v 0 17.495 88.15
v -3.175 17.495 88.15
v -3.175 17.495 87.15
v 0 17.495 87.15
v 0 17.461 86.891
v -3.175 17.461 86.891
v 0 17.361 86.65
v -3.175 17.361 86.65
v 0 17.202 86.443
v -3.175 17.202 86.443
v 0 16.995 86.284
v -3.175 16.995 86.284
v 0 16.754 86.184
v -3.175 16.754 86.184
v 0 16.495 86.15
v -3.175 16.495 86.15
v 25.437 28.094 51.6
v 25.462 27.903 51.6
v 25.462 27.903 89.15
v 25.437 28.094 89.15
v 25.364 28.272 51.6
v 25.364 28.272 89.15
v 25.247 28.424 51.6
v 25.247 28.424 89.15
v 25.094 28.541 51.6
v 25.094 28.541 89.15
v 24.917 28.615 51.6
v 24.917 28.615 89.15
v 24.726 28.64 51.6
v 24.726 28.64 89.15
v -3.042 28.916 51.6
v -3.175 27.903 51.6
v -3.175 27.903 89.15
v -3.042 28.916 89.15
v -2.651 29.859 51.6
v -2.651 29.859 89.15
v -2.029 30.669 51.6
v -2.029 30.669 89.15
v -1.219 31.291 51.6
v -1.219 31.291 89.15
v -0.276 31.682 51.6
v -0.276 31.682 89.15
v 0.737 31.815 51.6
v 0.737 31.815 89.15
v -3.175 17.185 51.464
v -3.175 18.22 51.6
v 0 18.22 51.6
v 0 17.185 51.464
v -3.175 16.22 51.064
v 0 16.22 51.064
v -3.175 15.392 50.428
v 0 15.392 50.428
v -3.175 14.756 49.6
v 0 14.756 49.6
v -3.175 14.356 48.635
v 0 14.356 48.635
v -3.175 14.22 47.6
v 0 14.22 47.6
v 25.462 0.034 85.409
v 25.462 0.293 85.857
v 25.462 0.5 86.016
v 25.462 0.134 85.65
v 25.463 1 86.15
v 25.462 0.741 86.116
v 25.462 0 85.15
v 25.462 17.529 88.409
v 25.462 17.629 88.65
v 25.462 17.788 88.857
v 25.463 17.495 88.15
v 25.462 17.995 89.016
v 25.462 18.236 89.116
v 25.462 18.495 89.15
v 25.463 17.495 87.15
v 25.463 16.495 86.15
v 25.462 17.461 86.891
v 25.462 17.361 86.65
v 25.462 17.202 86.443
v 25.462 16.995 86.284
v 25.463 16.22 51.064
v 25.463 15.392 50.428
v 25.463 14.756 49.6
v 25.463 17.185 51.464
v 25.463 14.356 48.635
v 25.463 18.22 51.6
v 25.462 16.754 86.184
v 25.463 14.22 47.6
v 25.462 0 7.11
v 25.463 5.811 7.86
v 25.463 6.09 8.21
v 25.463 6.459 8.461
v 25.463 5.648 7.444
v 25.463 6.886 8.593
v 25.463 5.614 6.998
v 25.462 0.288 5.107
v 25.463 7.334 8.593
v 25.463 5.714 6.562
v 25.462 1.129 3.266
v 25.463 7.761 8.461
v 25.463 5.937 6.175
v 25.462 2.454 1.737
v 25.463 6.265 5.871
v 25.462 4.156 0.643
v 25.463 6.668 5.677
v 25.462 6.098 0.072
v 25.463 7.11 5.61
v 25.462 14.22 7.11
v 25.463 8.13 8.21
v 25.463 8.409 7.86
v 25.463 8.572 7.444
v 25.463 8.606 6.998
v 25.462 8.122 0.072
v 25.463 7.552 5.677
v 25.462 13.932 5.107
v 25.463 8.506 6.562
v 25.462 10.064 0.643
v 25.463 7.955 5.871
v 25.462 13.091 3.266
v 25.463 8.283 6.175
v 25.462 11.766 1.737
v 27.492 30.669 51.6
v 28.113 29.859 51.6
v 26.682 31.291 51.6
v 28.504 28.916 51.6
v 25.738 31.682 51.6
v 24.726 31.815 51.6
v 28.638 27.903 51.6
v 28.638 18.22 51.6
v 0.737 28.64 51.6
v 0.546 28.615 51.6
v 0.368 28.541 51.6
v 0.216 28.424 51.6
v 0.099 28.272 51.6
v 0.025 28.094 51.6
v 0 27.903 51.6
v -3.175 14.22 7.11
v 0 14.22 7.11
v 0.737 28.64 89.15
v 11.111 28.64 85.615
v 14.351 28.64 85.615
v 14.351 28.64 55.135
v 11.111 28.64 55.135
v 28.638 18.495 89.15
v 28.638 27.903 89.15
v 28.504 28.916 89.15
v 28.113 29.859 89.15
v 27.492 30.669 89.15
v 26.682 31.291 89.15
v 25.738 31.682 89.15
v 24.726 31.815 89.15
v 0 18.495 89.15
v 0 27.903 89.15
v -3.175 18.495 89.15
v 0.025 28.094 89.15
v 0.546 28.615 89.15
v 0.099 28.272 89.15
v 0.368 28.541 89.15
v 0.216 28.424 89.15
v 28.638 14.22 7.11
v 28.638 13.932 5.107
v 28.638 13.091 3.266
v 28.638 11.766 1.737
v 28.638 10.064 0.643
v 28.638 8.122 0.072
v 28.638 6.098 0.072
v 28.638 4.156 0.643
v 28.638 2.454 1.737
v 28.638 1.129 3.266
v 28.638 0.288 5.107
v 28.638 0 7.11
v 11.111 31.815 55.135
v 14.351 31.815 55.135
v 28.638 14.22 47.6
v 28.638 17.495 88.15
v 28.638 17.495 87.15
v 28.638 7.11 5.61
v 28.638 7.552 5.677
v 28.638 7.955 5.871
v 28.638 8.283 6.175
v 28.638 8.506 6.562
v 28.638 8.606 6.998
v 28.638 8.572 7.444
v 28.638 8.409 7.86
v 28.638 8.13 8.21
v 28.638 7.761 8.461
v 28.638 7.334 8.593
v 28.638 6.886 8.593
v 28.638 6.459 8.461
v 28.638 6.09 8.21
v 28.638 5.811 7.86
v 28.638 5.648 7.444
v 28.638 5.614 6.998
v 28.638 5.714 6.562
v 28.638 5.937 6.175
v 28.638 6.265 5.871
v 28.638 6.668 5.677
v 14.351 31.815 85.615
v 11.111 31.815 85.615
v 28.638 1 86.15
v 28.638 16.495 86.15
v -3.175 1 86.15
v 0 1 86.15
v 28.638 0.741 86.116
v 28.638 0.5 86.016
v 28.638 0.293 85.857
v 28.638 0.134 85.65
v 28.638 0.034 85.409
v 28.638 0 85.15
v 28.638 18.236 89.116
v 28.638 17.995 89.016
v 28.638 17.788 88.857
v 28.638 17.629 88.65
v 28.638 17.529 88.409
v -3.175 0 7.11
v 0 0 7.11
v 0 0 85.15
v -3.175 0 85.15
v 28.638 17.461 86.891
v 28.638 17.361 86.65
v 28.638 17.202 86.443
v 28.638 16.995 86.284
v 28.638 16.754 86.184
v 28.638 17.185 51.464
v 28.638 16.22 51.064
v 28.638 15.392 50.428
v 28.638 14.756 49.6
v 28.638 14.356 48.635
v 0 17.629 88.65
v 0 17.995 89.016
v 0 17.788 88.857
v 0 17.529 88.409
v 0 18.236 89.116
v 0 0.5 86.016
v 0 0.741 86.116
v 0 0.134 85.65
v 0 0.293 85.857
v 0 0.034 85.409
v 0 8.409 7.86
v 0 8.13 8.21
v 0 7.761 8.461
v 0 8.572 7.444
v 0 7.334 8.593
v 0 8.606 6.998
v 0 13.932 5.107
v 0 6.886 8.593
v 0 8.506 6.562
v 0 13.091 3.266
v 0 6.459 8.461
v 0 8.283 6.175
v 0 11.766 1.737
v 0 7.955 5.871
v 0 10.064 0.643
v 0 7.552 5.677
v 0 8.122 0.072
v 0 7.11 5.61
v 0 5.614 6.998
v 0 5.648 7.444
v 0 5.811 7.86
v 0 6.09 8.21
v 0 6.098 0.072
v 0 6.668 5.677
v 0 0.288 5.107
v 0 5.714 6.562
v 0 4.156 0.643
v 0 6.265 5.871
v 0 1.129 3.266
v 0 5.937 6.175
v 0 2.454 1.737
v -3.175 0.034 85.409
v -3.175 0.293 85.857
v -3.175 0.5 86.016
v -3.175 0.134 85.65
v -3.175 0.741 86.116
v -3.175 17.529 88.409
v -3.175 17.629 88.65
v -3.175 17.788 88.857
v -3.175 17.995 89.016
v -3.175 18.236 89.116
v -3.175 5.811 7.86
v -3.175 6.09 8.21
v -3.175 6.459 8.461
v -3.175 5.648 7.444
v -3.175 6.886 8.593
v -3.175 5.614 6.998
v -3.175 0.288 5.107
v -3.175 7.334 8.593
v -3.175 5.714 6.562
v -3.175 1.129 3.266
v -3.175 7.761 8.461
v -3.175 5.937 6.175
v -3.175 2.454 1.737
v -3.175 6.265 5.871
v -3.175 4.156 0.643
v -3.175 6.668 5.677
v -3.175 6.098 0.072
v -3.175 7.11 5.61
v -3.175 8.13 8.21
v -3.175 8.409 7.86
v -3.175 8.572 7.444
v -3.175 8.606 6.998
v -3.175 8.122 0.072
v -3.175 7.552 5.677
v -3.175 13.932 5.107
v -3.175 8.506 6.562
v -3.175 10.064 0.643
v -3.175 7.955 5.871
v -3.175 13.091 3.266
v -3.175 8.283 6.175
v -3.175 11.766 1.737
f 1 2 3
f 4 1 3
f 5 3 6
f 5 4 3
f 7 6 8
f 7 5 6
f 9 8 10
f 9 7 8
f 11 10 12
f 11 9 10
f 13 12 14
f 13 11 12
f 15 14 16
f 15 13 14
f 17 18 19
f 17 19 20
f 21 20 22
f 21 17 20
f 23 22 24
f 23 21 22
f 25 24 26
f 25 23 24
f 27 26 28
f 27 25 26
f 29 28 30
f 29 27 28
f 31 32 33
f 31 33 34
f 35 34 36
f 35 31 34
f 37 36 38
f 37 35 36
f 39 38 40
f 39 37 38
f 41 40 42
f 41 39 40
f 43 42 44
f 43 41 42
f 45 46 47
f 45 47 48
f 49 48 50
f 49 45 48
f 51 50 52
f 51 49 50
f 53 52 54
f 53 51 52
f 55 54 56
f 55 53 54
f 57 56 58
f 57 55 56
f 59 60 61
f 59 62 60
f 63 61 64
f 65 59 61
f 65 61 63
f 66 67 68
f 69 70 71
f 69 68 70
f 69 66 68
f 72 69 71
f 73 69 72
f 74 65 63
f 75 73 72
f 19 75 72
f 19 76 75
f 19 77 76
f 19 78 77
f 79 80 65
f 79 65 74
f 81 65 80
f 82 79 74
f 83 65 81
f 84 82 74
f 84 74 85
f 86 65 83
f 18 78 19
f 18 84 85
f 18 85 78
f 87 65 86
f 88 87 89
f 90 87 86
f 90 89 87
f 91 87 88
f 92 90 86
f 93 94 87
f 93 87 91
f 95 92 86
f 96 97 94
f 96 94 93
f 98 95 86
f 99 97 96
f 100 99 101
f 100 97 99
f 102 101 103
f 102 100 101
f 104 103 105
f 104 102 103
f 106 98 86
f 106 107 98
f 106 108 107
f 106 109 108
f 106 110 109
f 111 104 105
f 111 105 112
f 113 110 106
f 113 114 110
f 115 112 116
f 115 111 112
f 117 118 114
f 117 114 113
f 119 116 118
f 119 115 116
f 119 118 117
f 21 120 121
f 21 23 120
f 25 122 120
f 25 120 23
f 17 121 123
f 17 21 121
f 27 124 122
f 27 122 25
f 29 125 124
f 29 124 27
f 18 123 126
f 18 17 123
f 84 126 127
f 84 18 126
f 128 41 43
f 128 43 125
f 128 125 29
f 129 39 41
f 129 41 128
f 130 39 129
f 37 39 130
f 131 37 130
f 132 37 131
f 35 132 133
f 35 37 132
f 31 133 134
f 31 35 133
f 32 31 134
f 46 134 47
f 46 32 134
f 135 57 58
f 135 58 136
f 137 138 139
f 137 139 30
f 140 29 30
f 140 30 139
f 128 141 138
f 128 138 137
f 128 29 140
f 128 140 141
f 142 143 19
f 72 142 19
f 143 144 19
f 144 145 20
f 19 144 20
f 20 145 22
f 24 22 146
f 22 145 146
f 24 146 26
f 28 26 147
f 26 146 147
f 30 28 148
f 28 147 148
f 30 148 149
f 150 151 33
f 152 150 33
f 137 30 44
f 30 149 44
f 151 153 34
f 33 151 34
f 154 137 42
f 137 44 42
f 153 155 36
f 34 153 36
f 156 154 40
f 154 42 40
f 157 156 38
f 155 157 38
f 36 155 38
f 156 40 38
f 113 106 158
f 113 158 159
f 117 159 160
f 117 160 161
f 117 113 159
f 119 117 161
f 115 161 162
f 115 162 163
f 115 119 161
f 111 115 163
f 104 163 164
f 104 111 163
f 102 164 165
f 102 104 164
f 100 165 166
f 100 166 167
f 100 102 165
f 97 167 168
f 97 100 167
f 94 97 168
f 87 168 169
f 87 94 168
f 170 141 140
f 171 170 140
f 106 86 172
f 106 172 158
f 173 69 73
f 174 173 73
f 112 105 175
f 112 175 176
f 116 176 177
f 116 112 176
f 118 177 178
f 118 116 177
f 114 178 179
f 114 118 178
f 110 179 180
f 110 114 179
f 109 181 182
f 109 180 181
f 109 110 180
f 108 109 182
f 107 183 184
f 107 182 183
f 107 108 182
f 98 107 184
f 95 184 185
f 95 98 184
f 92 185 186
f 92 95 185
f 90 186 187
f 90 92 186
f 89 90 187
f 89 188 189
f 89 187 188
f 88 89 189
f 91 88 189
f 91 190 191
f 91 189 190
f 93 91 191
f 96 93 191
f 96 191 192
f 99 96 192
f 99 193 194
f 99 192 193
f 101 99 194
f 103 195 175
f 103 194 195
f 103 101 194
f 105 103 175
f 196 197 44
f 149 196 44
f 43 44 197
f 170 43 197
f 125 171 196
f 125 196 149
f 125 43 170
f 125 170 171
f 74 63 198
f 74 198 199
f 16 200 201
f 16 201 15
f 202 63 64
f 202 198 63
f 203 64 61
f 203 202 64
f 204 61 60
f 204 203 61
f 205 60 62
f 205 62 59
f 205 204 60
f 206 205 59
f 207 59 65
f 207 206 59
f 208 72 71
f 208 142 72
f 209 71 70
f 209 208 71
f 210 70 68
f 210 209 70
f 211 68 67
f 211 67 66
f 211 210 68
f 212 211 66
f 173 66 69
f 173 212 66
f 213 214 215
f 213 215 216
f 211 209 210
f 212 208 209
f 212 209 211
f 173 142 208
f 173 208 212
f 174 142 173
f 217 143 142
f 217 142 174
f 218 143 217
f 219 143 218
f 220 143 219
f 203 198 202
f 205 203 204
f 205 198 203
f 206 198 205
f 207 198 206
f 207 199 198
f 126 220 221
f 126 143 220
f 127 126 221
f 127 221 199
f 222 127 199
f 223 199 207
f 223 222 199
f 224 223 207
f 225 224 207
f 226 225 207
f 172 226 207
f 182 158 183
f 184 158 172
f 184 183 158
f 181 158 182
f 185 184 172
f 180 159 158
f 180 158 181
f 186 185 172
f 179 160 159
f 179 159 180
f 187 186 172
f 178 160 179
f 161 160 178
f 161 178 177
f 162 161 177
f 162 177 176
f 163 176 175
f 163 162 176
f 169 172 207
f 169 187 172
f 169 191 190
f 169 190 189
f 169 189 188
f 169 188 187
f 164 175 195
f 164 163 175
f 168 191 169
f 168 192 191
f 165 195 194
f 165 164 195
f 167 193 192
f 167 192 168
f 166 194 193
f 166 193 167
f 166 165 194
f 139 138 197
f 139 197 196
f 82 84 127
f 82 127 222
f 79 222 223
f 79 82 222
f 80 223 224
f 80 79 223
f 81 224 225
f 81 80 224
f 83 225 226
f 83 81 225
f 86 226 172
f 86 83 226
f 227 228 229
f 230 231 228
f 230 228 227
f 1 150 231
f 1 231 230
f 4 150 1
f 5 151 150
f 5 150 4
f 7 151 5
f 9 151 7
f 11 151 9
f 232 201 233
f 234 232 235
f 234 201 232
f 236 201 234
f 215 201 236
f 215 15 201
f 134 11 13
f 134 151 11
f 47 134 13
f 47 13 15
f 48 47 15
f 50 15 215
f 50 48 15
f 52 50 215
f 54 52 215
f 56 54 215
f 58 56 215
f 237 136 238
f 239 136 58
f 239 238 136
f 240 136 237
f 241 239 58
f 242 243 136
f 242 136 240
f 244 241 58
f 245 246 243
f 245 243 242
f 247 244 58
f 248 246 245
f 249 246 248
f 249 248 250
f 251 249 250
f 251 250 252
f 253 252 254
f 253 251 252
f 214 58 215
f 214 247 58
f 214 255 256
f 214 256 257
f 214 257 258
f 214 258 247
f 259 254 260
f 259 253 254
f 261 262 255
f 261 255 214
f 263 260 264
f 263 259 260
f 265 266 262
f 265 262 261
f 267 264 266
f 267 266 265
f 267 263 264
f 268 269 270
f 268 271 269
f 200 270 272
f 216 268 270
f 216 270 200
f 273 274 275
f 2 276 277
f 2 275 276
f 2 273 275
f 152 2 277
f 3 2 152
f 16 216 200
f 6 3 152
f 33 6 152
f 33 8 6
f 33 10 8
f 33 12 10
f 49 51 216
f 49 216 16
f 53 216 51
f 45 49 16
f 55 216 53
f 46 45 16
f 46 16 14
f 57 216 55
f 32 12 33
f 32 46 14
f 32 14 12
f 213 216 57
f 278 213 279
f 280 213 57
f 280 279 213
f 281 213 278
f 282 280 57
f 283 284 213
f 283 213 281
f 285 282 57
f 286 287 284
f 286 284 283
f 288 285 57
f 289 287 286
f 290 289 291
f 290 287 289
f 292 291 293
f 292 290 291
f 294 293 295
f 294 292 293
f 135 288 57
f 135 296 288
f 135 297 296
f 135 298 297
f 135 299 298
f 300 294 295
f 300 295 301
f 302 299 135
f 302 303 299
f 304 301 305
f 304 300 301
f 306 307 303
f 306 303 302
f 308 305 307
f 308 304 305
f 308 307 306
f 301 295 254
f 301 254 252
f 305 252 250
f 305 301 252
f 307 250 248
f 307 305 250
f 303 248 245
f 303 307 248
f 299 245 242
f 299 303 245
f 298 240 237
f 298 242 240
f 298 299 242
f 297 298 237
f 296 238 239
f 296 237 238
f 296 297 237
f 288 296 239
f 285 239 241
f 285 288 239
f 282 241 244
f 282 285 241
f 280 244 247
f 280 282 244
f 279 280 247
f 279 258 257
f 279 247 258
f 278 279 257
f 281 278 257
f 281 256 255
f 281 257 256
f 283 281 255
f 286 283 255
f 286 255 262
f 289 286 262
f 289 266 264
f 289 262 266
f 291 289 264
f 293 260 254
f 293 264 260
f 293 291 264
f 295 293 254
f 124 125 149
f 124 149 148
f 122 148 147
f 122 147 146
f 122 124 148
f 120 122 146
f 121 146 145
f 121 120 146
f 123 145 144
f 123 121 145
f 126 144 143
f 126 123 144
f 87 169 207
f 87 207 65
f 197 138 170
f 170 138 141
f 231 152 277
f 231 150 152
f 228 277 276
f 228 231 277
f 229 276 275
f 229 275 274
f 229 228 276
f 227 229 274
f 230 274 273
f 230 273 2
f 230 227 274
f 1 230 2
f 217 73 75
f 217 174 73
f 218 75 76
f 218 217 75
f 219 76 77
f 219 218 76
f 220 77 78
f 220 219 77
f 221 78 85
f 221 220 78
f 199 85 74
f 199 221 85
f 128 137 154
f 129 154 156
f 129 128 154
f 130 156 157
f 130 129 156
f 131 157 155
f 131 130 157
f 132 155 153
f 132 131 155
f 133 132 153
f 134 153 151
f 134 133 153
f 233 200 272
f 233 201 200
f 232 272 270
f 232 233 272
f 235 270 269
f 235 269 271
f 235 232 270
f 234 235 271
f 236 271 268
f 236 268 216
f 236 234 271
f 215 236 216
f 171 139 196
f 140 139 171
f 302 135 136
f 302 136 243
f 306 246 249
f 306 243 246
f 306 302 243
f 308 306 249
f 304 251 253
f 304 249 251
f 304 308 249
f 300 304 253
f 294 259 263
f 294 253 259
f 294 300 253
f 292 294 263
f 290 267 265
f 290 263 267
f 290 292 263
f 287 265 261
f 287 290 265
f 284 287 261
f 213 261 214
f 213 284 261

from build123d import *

# Parameters (mm, degrees)
BRIDA_BASE1_DEPTH          = 89.15
CORTAR_EXTRUIR3_DEPTH      = 100.859660931
CORTAR_EXTRUIR3_DEPTH_BACK = 100.859660931
CROQUIS7_W                 = 3
CROQUIS7_H                 = 17.495
REDONDEO6_R                = 1
REDONDEO8_RADIUS           = 7.11
REDONDEO8_LENGTH           = 3.175
REDONDEO9_RADIUS           = 7.11
REDONDEO9_LENGTH           = 3.175
CORTAR_EXTRUIR4_DEPTH      = 100.859660931
CORTAR_EXTRUIR4_DEPTH_BACK = 100.859660931
CROQUIS14_R                = 1.5
CORTAR_EXTRUIR5_DEPTH      = 99.89399947
CORTAR_EXTRUIR5_DEPTH_BACK = 99.89399947
CROQUIS15_W                = 3.24
CROQUIS15_H                = 30.48


# Sheet-metal steps are written as plain solids
with BuildPart() as part:
    # Croquis1 → Brida base1 (new body)
    with BuildSketch(Plane.XY):
        with BuildLine():
            Line((25.4625, 0), (25.4625, 27.9034))
            ThreePointArc((25.4625, 27.9034), (25.246754855, 28.424254855), (24.7259, 28.64))
            Line((24.7259, 28.64), (0.7366, 28.64))
            ThreePointArc((0.7366, 28.64), (0.215745145, 28.424254855), (0, 27.9034))
            Line((0, 27.9034), (0, 0))
            Line((0, 0), (-3.175, 0))
            Line((-3.175, 0), (-3.175, 27.9034))
            ThreePointArc((-3.175, 27.9034), (-2.029318885, 30.669318885), (0.7366, 31.815))
            Line((0.7366, 31.815), (24.7259, 31.815))
            ThreePointArc((24.7259, 31.815), (27.491818885, 30.669318885), (28.6375, 27.9034))
            Line((28.6375, 27.9034), (28.6375, 0))
            Line((28.6375, 0), (25.4625, 0))
        make_face()
    extrude(amount=BRIDA_BASE1_DEPTH)

    # Croquis7 → Cortar-Extruir3 (cut, two sides: drawn at the far end of the back side and taken through both)
    with BuildSketch(Plane(origin=(28.6375, 0, 0), x_dir=(0, 0, -1), z_dir=(1, 0, 0)).offset(-CORTAR_EXTRUIR3_DEPTH_BACK)):
        with BuildLine():
            Line((0, 31.815), (-51.6, 31.815))
            Line((-51.6, 31.815), (-51.6, 18.22))
            ThreePointArc((-51.6, 18.22), (-50.428427125, 15.391572875), (-47.6, 14.22))
            Line((-47.6, 14.22), (0, 14.22))
            Line((0, 14.22), (0, 31.815))
        make_face()
        with Locations((-87.65, 8.7475)):
            Rectangle(CROQUIS7_W, CROQUIS7_H)
    extrude(amount=CORTAR_EXTRUIR3_DEPTH + CORTAR_EXTRUIR3_DEPTH_BACK, mode=Mode.SUBTRACT)

    # Redondeo6
    redondeo6_edges = [part.edges().sort_by_distance(p)[0] for p in [
        (-1.5875, 17.495, 86.15),
        (-1.5875, 17.495, 89.15),
        (-1.5875, 0, 86.15),
        (27.05, 17.495, 86.15),
        (27.05, 0, 86.15),
        (27.05, 17.495, 89.15),
    ]]
    fillet(redondeo6_edges, radius=REDONDEO6_R)

    # Redondeo8: full round fillet: the end face becomes a half cylinder, R = half its width
    redondeo8_face = Plane((27.05, 7.11, 0), x_dir=(-1, 0, 0), z_dir=(0, 0, -1))  # on the end face: x along it, z out of the body
    redondeo8_slab = redondeo8_face.offset(-REDONDEO8_RADIUS / 2) * Box(REDONDEO8_LENGTH, 2 * REDONDEO8_RADIUS, REDONDEO8_RADIUS, mode=Mode.PRIVATE)  # the body's end, R deep
    redondeo8_round = Plane((27.05, 7.11, 7.11), x_dir=(0, 0, -1), z_dir=(-1, 0, 0)) * Cylinder(REDONDEO8_RADIUS, REDONDEO8_LENGTH, mode=Mode.PRIVATE)  # its axis R under the face
    add(redondeo8_slab - redondeo8_round, mode=Mode.SUBTRACT)

    # Redondeo9: full round fillet: the end face becomes a half cylinder, R = half its width
    redondeo9_face = Plane((-1.5875, 7.11, 0), x_dir=(-1, 0, 0), z_dir=(0, 0, -1))  # on the end face: x along it, z out of the body
    redondeo9_slab = redondeo9_face.offset(-REDONDEO9_RADIUS / 2) * Box(REDONDEO9_LENGTH, 2 * REDONDEO9_RADIUS, REDONDEO9_RADIUS, mode=Mode.PRIVATE)  # the body's end, R deep
    redondeo9_round = Plane((-1.5875, 7.11, 7.11), x_dir=(0, 0, -1), z_dir=(-1, 0, 0)) * Cylinder(REDONDEO9_RADIUS, REDONDEO9_LENGTH, mode=Mode.PRIVATE)  # its axis R under the face
    add(redondeo9_slab - redondeo9_round, mode=Mode.SUBTRACT)

    # Croquis14 → Cortar-Extruir4 (cut, two sides: drawn at the far end of the back side and taken through both)
    with BuildSketch(Plane(origin=(28.6375, 0, 0), x_dir=(0, 0, -1), z_dir=(1, 0, 0)).offset(-CORTAR_EXTRUIR4_DEPTH_BACK)):
        with Locations((-7.11, 7.11)):
            Circle(CROQUIS14_R)
    extrude(amount=CORTAR_EXTRUIR4_DEPTH + CORTAR_EXTRUIR4_DEPTH_BACK, mode=Mode.SUBTRACT)

    # Croquis15 → Cortar-Extruir5 (cut, two sides: drawn at the far end of the back side and taken through both)
    with BuildSketch(Plane(origin=(0, 31.815, 0), x_dir=(1, 0, 0), z_dir=(0, 1, 0)).offset(-CORTAR_EXTRUIR5_DEPTH_BACK)):
        with Locations((12.73125, -70.375)):
            Rectangle(CROQUIS15_W, CROQUIS15_H)
    extrude(amount=CORTAR_EXTRUIR5_DEPTH + CORTAR_EXTRUIR5_DEPTH_BACK, mode=Mode.SUBTRACT)


solid = part.part
